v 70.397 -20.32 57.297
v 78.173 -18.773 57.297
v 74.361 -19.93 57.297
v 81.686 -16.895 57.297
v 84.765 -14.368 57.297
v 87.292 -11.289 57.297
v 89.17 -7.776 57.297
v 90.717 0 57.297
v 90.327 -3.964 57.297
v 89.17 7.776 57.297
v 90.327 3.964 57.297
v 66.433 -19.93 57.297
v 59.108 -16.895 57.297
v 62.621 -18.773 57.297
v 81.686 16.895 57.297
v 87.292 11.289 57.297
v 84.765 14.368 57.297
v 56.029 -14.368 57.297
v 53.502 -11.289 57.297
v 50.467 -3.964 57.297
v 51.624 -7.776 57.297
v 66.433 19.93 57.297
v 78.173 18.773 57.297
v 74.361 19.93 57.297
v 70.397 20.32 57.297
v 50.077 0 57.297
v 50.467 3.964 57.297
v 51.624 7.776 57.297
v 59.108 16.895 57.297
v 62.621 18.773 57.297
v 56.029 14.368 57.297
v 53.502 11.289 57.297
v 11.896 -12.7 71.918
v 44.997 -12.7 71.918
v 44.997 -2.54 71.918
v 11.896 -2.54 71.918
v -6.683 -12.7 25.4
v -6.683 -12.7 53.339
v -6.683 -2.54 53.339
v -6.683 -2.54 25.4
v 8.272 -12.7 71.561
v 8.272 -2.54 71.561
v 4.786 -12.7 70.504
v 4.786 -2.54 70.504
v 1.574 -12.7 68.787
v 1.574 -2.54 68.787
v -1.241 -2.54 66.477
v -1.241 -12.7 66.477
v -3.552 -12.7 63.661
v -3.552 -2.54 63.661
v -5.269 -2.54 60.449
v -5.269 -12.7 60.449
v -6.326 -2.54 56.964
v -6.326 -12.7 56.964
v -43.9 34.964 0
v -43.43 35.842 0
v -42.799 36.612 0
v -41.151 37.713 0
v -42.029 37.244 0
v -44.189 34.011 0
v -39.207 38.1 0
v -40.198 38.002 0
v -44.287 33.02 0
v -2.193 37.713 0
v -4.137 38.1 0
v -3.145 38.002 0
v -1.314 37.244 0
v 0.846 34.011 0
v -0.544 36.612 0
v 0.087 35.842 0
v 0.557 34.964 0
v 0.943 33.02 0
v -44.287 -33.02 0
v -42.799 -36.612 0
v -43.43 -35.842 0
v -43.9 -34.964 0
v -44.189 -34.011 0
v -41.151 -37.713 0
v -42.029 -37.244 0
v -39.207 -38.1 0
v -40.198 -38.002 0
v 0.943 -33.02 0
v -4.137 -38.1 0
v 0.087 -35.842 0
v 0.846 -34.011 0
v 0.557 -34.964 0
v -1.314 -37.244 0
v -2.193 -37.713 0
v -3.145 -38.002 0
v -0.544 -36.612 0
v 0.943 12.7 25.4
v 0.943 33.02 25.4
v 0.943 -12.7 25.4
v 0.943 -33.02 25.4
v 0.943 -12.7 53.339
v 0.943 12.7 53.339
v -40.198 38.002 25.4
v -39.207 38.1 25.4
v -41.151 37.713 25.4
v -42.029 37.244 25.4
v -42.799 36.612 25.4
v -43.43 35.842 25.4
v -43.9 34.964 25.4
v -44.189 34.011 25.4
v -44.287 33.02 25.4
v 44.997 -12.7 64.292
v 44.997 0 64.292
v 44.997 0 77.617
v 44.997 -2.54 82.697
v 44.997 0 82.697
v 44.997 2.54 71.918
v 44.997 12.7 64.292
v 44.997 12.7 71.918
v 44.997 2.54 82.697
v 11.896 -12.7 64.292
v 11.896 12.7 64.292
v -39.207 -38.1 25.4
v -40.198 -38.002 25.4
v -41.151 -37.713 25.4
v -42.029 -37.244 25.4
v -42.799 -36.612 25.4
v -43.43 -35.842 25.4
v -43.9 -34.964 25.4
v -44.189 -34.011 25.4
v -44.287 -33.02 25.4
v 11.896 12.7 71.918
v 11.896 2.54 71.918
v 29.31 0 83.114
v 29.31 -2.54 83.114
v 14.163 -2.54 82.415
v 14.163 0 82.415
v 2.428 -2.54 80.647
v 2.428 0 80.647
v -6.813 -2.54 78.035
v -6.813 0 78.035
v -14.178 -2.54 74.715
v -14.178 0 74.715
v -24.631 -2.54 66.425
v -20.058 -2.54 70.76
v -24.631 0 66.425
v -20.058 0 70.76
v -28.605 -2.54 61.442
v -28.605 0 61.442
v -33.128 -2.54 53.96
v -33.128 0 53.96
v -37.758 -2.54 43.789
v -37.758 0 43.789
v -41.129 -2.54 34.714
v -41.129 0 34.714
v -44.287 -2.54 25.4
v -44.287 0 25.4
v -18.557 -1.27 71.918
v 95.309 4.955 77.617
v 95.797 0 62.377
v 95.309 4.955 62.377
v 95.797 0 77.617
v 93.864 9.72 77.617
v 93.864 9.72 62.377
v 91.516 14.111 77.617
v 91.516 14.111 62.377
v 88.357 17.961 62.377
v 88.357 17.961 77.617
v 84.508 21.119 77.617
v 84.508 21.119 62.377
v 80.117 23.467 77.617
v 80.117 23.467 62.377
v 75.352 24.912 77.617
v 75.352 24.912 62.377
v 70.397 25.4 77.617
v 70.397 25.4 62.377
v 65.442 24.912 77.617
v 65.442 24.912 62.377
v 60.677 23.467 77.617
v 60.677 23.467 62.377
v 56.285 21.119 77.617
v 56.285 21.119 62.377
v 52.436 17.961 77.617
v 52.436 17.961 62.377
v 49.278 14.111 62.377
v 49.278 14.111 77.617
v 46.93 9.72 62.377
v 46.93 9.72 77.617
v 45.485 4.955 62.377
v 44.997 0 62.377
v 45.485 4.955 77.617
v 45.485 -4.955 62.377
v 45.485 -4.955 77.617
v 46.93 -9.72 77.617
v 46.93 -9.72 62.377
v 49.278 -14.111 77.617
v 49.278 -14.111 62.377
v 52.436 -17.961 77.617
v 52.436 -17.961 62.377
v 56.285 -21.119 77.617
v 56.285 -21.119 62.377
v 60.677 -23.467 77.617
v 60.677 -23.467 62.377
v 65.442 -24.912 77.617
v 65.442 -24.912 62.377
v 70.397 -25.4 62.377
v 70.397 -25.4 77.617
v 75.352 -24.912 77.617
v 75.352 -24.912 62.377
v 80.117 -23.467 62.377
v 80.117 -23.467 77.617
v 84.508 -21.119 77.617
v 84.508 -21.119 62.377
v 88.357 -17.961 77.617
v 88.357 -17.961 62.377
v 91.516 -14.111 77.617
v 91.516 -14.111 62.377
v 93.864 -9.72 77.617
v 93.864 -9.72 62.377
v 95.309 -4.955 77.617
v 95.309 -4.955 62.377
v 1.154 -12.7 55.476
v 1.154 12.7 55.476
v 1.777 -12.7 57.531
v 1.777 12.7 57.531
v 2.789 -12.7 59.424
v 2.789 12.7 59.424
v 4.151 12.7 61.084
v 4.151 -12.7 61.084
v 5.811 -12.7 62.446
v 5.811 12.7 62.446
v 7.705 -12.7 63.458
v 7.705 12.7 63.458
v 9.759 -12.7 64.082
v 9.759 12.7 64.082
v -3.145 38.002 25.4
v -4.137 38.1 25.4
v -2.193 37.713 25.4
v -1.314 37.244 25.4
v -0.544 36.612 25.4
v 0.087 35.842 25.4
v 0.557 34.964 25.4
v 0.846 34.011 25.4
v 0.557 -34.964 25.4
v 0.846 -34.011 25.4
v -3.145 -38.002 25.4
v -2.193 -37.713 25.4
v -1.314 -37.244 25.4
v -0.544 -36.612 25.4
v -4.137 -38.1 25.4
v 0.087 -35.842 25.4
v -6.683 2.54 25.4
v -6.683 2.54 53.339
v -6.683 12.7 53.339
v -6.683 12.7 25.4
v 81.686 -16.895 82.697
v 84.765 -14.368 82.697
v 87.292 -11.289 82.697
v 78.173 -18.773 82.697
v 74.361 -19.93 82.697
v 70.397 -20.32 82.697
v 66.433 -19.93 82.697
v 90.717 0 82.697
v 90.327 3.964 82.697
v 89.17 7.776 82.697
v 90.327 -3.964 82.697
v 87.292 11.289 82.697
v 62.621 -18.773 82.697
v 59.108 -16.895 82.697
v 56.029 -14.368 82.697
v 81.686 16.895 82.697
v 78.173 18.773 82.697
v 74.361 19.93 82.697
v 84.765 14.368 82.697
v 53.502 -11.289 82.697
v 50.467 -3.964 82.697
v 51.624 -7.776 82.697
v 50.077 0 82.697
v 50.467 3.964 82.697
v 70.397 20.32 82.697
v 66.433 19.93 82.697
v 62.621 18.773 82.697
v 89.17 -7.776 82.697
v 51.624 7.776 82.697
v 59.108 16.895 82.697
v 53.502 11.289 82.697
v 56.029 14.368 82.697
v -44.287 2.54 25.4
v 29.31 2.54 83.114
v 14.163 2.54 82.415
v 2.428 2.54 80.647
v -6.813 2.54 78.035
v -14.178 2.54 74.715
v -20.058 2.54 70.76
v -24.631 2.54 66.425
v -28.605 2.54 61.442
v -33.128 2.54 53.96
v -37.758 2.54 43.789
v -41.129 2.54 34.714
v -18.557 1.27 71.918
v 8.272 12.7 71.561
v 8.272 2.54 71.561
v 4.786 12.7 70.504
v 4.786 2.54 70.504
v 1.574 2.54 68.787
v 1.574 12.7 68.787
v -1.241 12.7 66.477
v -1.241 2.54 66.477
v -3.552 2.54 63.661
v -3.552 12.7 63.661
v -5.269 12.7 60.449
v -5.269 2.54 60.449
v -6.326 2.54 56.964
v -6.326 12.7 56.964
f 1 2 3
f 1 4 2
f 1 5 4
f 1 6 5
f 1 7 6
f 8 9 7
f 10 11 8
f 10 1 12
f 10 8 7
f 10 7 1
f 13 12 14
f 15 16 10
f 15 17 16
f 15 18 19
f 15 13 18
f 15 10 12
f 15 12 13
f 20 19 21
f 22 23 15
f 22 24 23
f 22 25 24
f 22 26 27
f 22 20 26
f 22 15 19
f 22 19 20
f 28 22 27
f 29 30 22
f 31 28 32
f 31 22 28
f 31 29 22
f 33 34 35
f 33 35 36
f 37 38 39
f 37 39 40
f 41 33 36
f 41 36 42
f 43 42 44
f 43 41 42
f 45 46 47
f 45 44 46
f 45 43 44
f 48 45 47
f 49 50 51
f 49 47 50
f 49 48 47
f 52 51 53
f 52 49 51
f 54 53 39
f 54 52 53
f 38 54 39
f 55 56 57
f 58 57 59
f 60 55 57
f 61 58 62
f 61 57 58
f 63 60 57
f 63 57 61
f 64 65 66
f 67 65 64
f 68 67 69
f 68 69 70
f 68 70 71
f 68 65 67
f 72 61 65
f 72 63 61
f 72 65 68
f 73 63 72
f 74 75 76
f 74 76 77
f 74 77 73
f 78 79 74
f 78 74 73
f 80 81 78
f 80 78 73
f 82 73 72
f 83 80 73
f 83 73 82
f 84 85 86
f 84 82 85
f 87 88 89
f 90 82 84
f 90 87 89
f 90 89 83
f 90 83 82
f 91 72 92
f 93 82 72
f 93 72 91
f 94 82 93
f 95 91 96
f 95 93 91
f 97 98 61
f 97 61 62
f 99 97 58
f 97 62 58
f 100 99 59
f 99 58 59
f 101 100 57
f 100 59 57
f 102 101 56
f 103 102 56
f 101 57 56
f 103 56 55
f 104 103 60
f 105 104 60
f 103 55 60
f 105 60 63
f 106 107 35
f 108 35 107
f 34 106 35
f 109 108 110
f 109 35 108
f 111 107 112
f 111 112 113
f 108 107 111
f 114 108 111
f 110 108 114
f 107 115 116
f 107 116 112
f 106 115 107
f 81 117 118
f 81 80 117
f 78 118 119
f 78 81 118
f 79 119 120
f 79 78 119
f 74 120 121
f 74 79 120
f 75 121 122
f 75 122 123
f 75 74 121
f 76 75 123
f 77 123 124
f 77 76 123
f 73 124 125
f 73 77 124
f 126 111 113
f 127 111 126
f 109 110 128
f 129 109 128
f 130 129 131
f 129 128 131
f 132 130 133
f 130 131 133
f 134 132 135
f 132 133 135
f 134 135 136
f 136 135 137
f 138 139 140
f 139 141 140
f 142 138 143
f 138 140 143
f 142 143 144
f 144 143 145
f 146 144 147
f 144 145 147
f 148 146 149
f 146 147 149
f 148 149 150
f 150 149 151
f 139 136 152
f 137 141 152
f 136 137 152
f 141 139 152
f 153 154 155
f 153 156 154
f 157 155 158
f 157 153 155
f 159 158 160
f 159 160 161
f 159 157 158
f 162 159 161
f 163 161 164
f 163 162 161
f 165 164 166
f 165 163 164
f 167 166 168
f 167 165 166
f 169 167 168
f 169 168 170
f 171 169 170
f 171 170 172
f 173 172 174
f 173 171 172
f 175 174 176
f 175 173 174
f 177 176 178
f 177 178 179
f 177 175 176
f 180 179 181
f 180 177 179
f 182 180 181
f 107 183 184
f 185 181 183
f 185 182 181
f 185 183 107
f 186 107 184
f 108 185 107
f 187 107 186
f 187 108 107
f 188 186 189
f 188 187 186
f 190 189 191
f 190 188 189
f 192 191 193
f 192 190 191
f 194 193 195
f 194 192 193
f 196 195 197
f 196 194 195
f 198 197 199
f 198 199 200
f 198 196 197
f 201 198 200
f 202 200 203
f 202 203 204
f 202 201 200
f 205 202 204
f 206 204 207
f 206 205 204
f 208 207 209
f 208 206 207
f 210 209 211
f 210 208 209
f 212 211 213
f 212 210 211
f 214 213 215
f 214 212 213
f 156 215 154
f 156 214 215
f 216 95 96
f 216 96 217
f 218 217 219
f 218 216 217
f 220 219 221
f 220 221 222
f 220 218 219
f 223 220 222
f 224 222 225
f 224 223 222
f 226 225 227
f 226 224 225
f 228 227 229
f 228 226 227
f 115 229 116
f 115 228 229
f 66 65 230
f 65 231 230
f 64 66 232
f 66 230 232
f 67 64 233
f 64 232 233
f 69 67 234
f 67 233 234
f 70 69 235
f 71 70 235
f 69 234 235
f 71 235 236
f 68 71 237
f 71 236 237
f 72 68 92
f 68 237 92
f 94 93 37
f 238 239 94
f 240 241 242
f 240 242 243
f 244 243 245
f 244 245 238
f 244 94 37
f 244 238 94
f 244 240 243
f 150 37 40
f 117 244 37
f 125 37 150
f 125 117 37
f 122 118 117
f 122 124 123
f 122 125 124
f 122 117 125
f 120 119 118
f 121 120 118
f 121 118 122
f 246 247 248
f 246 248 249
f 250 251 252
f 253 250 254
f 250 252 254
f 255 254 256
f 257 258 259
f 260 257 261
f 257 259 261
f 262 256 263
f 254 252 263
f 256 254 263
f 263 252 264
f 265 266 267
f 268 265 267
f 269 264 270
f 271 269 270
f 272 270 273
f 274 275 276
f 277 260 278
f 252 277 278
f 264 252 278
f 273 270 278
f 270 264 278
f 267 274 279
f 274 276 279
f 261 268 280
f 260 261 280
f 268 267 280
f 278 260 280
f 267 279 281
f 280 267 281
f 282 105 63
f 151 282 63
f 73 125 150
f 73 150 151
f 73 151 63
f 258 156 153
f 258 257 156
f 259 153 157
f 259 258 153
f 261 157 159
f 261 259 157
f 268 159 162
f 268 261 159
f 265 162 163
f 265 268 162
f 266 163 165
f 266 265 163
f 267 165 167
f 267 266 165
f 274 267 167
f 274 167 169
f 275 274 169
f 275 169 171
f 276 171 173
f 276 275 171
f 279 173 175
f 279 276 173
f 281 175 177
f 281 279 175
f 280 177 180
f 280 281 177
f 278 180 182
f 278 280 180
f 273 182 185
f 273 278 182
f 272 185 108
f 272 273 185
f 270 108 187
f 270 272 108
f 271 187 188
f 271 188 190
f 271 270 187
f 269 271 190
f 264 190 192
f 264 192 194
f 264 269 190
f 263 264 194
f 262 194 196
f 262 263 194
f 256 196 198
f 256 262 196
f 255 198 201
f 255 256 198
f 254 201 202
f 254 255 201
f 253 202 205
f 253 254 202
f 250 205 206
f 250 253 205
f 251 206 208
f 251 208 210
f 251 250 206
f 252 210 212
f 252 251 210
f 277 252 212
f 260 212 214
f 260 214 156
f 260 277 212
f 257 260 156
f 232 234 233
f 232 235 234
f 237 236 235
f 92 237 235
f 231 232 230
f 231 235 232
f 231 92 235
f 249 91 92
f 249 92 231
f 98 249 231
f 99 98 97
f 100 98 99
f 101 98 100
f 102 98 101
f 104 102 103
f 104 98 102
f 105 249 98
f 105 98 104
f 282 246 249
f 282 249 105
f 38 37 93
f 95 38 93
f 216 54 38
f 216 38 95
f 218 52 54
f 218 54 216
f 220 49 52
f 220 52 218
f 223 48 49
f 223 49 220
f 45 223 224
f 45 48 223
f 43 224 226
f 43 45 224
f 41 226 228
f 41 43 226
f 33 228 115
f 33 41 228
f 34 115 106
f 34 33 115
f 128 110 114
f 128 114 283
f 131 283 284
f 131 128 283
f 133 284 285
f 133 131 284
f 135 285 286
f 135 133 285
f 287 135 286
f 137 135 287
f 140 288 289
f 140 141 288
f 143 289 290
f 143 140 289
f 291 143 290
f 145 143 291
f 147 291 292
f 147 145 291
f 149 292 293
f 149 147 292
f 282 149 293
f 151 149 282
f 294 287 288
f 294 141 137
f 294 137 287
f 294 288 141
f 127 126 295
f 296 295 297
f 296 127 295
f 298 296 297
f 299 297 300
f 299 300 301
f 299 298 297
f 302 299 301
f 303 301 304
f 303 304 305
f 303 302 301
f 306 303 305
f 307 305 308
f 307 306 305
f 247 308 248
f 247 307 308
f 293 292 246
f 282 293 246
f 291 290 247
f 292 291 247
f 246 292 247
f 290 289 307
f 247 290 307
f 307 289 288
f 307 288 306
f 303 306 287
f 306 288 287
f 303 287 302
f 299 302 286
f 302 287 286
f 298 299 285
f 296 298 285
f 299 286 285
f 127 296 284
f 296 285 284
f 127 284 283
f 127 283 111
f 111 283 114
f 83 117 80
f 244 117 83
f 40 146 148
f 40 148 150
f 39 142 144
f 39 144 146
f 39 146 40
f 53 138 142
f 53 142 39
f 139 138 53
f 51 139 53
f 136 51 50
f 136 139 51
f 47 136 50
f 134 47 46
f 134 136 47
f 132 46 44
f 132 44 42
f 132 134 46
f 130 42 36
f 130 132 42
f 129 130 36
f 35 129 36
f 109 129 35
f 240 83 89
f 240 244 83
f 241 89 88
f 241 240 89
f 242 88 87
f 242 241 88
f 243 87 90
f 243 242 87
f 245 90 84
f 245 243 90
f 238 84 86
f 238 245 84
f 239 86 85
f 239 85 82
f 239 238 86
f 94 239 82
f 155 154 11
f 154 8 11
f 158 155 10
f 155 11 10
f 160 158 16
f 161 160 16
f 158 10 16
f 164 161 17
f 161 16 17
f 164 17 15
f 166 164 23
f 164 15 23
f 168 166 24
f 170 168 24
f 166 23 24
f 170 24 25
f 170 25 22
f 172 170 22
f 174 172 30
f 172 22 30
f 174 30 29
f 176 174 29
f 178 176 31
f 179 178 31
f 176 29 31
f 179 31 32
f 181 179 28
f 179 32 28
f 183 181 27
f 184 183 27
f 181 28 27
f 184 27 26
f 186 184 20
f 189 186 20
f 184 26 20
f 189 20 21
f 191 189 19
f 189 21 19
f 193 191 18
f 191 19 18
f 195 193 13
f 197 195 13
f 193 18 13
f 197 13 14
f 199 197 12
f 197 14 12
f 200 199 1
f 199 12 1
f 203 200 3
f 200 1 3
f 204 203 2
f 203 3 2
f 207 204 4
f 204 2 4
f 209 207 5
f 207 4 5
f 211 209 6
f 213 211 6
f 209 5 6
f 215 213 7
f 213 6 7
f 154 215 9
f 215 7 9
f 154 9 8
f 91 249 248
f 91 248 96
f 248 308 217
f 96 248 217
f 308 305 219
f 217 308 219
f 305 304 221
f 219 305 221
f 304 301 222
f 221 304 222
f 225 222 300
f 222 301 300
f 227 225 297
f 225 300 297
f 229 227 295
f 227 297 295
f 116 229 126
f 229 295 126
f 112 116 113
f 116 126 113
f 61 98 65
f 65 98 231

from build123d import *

# Parameters (mm, degrees)
F1_DEPTH    = 38.1
F2_DEPTH    = 2.54
F0_W        = 25.4
F0_H        = 25.4
F4_DEPTH    = 12.7
F5_R        = 5.08
F6_T2_ANGLE = 180
F6_T4_ANGLE = 180


# Not quite as in the source:
# - a fillet or chamfer that OpenCascade refuses, or shapes differently, is made with other operations: its cross-section is extruded or revolved along the edge and cut away or added


with BuildPart() as f1:
    # F0 (on Front) → F1 (new body, symmetric)
    with BuildSketch(Plane.XZ):
        Polygon((-44.2866310477, 25.4), (-44.2866310477, 0), (0.9434421729, 0), (0.9434421729, 25.4), (-6.6829477437, 25.4), align=None)
    extrude(amount=F1_DEPTH, both=True)

    # F0 (on Front) → F2 (join, symmetric)
    with BuildSketch(Plane.XZ):
        with BuildLine():
            add(Edge.make_bspline(
                [(44.9969768524, 82.6969615459), (20.8074855996, 83.9490606701), (-25.6210994511, 82.0372772331), (-38.1906192957, 43.6191001085), (-44.2866310477, 25.4)],
                knots=[0, 0, 0, 0, 0.5240773197, 1, 1, 1, 1], degree=3))
            Line((-44.2866310477, 25.4), (-6.6829477437, 25.4))
            Line((-6.6829477437, 25.4), (-6.6829477437, 53.3393811594))
            ThreePointArc((-6.6829477437, 53.3393811594), (-1.2412562476, 66.4767865715), (11.8961491644, 71.9184780675))
            Line((11.8961491644, 71.9184780675), (44.9969768524, 71.9184780675))
            Line((44.9969768524, 71.9184780675), (44.9969768524, 82.6969615459))
        make_face()
    extrude(amount=F2_DEPTH, both=True)

    # F0 (on Front) → F3 (revolve)
    with BuildSketch(Plane.XZ):
        with Locations((83.0969768524, 69.9969615459)):
            Rectangle(F0_W, F0_H)
    revolve(axis=Axis((70.3969768524, 0, 69.9969615459), (0, 0, 1)))

    # F0 (on Front) → F4 (join, symmetric)
    with BuildSketch(Plane.XZ):
        with BuildLine():
            Line((-6.6829477437, 25.4), (0.9434421729, 25.4))
            Line((0.9434421729, 25.4), (0.9434421729, 53.3393811594))
            ThreePointArc((0.9434421729, 53.3393811594), (4.1514157783, 61.0841145455), (11.8961491644, 64.292088151))
            Line((11.8961491644, 64.292088151), (44.9969768524, 64.292088151))
            Line((44.9969768524, 64.292088151), (44.9969768524, 71.9184780675))
            Line((44.9969768524, 71.9184780675), (11.8961491644, 71.9184780675))
            ThreePointArc((11.8961491644, 71.9184780675), (-1.2412562476, 66.4767865715), (-6.6829477437, 53.3393811594))
            Line((-6.6829477437, 53.3393811594), (-6.6829477437, 25.4))
        make_face()
    extrude(amount=F4_DEPTH, both=True)

    # F5
    f5_edges = [f1.edges().sort_by_distance(p)[0] for p in [
        (-44.286631, -38.1, 12.7),
        (0.943442, -38.1, 12.7),
        (0.943442, 38.1, 12.7),
        (-44.286631, 38.1, 12.7),
    ]]
    fillet(f5_edges, radius=F5_R)

    # F6: chamfer of 5.08 on 3 edges, made by hand

    # F6_s1 → F6_t2 (revolve, cut)
    with BuildSketch(Plane.XZ):
        Polygon((95.7969768524, 77.6169615459), (90.7169768524, 82.6969615459), (95.7969768524, 82.6969615459), align=None)
    revolve(axis=Axis((70.3969768524, 0, 82.6969615459), (0, 0, 1)), revolution_arc=F6_T2_ANGLE, mode=Mode.SUBTRACT)

    # F6_s3 → F6_t4 (revolve, cut)
    with BuildSketch(Plane.XZ):
        Polygon((44.9969768524, 77.6169615459), (50.0769768524, 82.6969615459), (44.9969768524, 82.6969615459), align=None)
    revolve(axis=Axis((70.3969768524, 0, 82.6969615459), (0, 0, 1)), revolution_arc=F6_T4_ANGLE, mode=Mode.SUBTRACT)

    # F6_s5 → F6_t6 (revolve, cut)
    with BuildSketch(Plane.XZ):
        Polygon((95.7969768524, 62.3769615459), (90.7169768524, 57.2969615459), (95.7969768524, 57.2969615459), align=None)
    revolve(axis=Axis((70.3969768524, 0, 57.2969615459), (0, 0, 1)), mode=Mode.SUBTRACT)


solid = f1.part
